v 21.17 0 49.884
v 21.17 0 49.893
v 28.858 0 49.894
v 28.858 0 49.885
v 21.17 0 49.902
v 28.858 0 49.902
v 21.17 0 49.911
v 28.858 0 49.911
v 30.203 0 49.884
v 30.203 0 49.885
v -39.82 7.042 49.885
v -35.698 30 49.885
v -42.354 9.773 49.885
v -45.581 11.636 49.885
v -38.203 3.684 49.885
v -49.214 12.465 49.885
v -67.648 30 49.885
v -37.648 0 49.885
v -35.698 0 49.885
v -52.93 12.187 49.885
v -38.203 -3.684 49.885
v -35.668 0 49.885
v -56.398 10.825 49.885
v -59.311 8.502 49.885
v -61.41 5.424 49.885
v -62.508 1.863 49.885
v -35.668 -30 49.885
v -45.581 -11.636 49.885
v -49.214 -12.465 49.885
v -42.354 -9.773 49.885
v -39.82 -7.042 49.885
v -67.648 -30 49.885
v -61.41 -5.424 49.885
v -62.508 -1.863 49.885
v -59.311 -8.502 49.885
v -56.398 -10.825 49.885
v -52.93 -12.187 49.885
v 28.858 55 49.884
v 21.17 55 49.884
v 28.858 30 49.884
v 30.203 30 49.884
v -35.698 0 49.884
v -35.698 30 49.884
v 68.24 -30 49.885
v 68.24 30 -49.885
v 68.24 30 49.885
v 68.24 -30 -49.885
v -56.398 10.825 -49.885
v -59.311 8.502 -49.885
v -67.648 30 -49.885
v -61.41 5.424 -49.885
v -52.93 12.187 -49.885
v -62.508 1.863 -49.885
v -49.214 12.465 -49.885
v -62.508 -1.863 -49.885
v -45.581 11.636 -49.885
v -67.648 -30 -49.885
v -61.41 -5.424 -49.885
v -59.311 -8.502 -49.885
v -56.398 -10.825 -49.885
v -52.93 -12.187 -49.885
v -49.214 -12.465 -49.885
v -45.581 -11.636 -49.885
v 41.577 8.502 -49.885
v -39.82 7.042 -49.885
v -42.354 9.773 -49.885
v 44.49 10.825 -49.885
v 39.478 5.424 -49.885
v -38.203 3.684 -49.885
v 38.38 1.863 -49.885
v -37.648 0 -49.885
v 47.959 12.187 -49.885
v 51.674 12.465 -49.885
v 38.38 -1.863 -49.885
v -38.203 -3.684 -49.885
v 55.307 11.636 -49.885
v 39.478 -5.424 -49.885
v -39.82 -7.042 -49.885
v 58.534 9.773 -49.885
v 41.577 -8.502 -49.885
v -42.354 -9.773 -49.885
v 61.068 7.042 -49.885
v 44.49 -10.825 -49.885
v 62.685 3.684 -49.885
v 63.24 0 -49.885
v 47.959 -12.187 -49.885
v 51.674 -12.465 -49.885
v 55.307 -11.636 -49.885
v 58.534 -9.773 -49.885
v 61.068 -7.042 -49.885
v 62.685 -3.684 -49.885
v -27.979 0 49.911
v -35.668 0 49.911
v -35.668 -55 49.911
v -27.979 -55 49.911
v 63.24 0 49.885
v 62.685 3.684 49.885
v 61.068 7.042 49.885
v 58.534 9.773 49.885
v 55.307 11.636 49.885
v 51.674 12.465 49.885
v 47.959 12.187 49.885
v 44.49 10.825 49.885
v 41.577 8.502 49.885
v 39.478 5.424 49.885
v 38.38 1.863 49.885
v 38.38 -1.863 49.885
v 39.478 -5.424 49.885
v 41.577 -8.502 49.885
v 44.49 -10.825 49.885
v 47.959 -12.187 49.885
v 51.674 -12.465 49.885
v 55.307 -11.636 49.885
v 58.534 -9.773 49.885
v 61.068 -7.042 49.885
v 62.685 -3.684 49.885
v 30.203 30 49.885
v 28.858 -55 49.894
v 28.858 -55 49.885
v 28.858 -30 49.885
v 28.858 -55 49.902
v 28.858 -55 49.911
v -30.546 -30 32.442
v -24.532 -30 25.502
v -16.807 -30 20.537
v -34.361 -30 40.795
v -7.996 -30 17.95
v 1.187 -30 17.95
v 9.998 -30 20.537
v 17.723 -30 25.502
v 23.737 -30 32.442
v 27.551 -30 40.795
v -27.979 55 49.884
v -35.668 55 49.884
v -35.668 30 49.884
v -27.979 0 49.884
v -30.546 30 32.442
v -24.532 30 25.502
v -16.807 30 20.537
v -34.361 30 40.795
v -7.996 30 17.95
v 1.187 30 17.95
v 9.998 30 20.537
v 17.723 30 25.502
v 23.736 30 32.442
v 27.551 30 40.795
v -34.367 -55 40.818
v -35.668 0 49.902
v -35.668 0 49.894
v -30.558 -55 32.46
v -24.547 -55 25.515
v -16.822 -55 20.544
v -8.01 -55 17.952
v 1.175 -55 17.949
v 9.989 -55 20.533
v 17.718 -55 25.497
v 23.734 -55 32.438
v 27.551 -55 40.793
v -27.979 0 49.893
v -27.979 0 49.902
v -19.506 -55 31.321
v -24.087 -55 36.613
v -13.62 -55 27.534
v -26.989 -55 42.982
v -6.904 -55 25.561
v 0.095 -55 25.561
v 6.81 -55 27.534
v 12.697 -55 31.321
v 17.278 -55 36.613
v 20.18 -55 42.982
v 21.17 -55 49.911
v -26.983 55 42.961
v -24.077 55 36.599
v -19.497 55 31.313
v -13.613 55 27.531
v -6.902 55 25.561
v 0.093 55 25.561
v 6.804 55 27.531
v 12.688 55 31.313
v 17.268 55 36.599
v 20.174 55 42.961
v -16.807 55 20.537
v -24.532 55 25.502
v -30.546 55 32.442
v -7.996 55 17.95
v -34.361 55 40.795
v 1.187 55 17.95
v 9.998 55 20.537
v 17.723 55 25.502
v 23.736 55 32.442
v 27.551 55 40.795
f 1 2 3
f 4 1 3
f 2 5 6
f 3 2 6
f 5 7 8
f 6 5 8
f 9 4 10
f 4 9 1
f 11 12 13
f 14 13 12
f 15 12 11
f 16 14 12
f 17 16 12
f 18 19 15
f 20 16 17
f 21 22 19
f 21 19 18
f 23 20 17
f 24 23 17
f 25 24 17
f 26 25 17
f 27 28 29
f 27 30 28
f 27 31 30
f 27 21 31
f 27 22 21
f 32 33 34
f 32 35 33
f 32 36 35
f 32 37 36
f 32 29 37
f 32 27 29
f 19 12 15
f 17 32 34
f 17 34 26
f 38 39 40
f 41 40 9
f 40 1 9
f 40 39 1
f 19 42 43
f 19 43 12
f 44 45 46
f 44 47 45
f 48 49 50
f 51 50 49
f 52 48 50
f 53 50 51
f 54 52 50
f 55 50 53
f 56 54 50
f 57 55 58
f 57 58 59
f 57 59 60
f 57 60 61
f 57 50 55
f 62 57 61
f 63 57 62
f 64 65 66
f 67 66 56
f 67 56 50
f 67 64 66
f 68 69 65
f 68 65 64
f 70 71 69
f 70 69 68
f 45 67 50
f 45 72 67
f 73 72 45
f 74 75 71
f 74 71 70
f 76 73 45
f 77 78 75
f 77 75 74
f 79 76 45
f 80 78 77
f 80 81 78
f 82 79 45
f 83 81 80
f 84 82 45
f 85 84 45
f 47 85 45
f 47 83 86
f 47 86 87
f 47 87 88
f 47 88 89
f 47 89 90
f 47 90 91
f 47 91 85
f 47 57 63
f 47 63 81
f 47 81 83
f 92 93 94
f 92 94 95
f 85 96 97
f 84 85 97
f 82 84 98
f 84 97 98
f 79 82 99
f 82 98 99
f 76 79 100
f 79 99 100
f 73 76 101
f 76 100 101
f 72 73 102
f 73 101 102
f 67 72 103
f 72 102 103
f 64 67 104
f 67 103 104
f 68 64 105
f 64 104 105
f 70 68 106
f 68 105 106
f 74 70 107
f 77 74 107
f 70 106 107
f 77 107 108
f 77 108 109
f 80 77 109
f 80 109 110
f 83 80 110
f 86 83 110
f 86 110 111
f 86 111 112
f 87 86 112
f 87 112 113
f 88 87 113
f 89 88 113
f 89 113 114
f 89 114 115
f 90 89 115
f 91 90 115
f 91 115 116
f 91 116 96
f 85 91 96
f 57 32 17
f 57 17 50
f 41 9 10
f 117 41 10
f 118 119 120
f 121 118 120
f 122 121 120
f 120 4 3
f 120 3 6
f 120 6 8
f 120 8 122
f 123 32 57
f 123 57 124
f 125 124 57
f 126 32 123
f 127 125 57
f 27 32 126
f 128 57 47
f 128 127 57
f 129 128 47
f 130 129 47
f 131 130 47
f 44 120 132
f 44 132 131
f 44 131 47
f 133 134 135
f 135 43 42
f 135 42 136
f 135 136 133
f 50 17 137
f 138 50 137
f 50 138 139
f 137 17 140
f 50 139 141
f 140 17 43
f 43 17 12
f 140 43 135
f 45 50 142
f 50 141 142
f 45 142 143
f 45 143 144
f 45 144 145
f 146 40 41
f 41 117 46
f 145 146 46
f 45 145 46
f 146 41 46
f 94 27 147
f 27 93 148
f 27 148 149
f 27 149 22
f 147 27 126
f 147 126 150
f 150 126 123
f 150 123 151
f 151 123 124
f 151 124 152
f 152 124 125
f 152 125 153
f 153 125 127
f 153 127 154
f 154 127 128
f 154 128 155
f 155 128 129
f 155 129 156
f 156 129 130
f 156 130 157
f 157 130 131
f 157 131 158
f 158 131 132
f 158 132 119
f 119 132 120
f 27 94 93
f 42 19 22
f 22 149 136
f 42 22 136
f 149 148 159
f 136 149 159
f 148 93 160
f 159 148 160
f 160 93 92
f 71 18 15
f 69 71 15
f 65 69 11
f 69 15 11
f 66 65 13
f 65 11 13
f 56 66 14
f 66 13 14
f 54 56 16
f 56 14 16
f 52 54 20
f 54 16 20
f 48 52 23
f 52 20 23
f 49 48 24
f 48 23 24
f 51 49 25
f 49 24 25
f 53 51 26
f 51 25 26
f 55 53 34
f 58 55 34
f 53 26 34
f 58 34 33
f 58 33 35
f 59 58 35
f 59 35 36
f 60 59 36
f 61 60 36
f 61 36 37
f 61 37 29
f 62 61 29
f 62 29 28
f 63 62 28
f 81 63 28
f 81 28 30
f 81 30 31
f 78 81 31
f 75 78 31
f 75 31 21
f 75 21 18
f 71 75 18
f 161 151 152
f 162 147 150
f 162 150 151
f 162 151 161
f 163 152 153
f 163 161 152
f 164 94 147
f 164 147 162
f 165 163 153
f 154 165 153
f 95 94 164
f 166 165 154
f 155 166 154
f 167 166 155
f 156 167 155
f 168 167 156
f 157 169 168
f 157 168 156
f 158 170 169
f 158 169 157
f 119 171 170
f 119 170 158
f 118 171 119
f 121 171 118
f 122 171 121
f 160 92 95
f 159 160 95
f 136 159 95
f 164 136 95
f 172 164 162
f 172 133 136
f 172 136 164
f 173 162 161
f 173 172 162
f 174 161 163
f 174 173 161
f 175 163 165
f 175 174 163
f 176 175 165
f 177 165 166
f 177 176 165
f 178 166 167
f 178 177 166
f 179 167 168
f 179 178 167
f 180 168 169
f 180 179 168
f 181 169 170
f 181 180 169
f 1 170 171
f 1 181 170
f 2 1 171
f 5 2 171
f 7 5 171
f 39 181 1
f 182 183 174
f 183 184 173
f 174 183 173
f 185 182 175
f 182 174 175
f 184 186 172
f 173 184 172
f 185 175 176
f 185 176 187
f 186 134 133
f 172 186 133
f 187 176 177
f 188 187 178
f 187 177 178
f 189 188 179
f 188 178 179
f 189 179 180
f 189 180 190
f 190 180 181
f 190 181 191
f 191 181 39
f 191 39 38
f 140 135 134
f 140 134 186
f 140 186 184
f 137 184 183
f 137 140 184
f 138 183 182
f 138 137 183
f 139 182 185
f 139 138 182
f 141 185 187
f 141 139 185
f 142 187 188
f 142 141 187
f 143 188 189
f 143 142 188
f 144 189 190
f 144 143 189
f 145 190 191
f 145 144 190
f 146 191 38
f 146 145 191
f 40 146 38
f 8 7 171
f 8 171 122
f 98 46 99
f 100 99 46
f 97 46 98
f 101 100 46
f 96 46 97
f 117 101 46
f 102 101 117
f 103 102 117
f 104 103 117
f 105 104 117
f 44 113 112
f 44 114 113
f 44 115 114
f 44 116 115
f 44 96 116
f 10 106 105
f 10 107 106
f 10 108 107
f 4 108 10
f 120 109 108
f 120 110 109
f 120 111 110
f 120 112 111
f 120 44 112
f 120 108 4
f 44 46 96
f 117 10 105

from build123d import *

# Parameters (mm, degrees)
F2_DEPTH  = 30
F1_R      = 32.262952
F1_R_2    = 24.574153
F4_DEPTH  = 55
F6_W      = 65.900745
F6_H      = 33.107504
F7_DEPTH  = 55
F8_W      = 65.835031
F8_H      = 35.700139
F9_DEPTH  = 55
F10_R     = 12.5
F11_DEPTH = 100
F12_R     = 12.5
F13_DEPTH = 100


with BuildPart() as f2:
    # F1 (on face) → F2 (new body)
    with BuildSketch(Plane.XZ):
        with BuildLine():
            Line((68.240136, 49.884874), (28.858346, 49.884874))
            ThreePointArc((28.858346, 49.884874), (-3.404606, 17.621922), (-35.667558, 49.884874))
            Line((-35.667558, 49.884874), (-67.648031, 49.884874))
            Line((-67.648031, 49.884874), (-67.648031, -49.884874))
            Line((-67.648031, -49.884874), (68.240136, -49.884874))
            Line((68.240136, -49.884874), (68.240136, 49.884874))
        make_face()
    extrude(amount=F2_DEPTH)

    # F3: F2 across face


with BuildPart() as f2_1:
    add(f2.part)
    add(f2.part.mirror(Plane(origin=(0.803557, 0, -4.963344), x_dir=(1, 0, 0), z_dir=(0, 1, 0))))

    # F1 (on face) → F4 (join)
    with BuildSketch(Plane.XZ):
        with Locations((-3.404606, 49.884874)):
            Circle(F1_R)
        with Locations((-3.404606, 49.884874)):
            Circle(F1_R_2, mode=Mode.SUBTRACT)
    extrude(amount=F4_DEPTH)

    # F5: F2 across face


with BuildPart() as f2_2:
    add(f2_1.part)
    add(f2_1.part.mirror(Plane(origin=(-3.404606, 0, 49.884874), x_dir=(1, 0, 0), z_dir=(0, 1, 0))))

    # F6 (on Front) → F7 (cut)
    with BuildSketch(Plane.XZ):
        with Locations((-2.747394, 66.43793)):
            Rectangle(F6_W, F6_H)
    extrude(amount=-F7_DEPTH, mode=Mode.SUBTRACT)

    # F8 (on Front) → F9 (cut)
    with BuildSketch(Plane.XZ):
        with Locations((-3.836475, 67.761236)):
            Rectangle(F8_W, F8_H)
    extrude(amount=F9_DEPTH, mode=Mode.SUBTRACT)

    # F10 (on face) → F11 (cut)
    with BuildSketch(Plane.XY.offset(49.884874)):
        with Locations((-50.148031, 0)):
            Circle(F10_R)
    extrude(amount=-F11_DEPTH, mode=Mode.SUBTRACT)

    # F12 (on face) → F13 (cut)
    with BuildSketch(Plane.XY.offset(49.884874)):
        with Locations((50.740136, 0)):
            Circle(F12_R)
    extrude(amount=-F13_DEPTH, mode=Mode.SUBTRACT)


solid = f2_2.part
